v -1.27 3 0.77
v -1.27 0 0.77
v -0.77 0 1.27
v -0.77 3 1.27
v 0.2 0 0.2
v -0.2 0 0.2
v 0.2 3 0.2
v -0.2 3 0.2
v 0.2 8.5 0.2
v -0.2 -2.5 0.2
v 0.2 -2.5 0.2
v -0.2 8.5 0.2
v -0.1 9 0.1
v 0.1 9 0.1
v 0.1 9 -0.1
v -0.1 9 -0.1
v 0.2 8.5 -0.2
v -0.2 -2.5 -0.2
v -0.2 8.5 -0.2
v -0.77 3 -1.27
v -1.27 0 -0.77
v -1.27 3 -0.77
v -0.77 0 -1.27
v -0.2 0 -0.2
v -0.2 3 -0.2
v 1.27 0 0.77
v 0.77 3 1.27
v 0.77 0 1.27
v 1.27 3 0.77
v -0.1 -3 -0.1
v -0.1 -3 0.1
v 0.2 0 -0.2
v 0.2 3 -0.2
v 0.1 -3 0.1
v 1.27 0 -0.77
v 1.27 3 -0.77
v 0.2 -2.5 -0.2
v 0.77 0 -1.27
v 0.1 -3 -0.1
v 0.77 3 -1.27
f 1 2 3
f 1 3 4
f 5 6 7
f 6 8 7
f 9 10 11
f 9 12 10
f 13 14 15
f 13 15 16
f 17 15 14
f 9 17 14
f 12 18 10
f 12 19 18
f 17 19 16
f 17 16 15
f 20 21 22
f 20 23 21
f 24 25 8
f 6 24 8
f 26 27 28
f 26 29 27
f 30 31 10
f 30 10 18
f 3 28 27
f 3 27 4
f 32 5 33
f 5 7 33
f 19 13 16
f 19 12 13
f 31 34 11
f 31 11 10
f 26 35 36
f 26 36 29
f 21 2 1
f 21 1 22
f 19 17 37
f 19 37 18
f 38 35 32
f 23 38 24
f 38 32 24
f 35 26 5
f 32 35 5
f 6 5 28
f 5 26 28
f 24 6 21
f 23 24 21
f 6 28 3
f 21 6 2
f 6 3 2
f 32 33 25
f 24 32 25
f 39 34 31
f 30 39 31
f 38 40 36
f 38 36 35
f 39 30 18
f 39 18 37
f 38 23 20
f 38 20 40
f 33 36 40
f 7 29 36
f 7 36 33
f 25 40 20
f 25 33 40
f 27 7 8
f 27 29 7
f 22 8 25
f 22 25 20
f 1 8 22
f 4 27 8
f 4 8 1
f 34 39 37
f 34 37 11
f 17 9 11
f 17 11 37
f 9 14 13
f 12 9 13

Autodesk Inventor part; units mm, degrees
ref_plane "YZ Plane" through (0, 0, 0) normal (1, 0, 0) x (0, 1, 0)
ref_plane "XZ Plane" through (0, 0, 0) normal (0, 1, 0) x (-1, 0, 0)
ref_plane "XY Plane" through (0, 0, 0) normal (0, 0, 1) x (1, 0, 0)
sketch "Sketch1" plane through (0, 0, 0) normal (0, 1, 0) x (-1, 0, 0)
  line L0 (-1.27, 1.27) -> (1.27, 1.27)
  line L1 (1.27, 1.27) -> (1.27, -1.27)
  line L2 (1.27, -1.27) -> (-1.27, -1.27)
  line L3 (-1.27, -1.27) -> (-1.27, 1.27)
  line L4 (-1.27, 1.27) -> (1.27, -1.27) construction
  line L5 (1.27, 1.27) -> (-1.27, -1.27) construction
  line L6 (-0.3, 0.3) -> (0.3, 0.3)
  line L7 (0.3, 0.3) -> (0.3, -0.3)
  line L8 (0.3, -0.3) -> (-0.3, -0.3)
  line L9 (-0.3, -0.3) -> (-0.3, 0.3)
  line L10 (-0.3, 0.3) -> (0.3, -0.3) construction
  line L11 (0.3, 0.3) -> (-0.3, -0.3) construction
  point P0 (0, 0)
  dimension "d0" = 2.54
  dimension "d1" = 2.54
  dimension "d2" = 0.6
  dimension "d3" = 0.6
extrude "Extrusion1" add sketch "Sketch1" along normal blind 9 and the other way blind 3 contours L6 L7 L8 L9
extrude "Extrusion2" add sketch "Sketch1" along normal blind 3 separate body
sketch "Sketch2" plane through (0, 9, 0) normal (0, 1, 0) x (1, 0, 0)
  line L0 (-0.2, -0.2) -> (0.2, -0.2)
  line L1 (0.2, -0.2) -> (0.2, 0.2)
  line L2 (0.2, 0.2) -> (-0.2, 0.2)
  line L3 (-0.2, 0.2) -> (-0.2, -0.2)
  line L4 (-0.2, -0.2) -> (0.2, 0.2) construction
  line L5 (0.2, -0.2) -> (-0.2, 0.2) construction
  line L6 (-2.0289, -1.4927) -> (2.0289, -1.4927)
  line L7 (2.0289, -1.4927) -> (2.0289, 1.4927)
  line L8 (2.0289, 1.4927) -> (-2.0289, 1.4927)
  line L9 (-2.0289, 1.4927) -> (-2.0289, -1.4927)
  line L10 (-2.0289, -1.4927) -> (2.0289, 1.4927) construction
  line L11 (2.0289, -1.4927) -> (-2.0289, 1.4927) construction
  point P0 (0, 0)
  dimension "d37" = 0.4
  dimension "d38" = 0.4
extrude "Extrusion3" cut sketch "Sketch2" against normal blind 20 bodies 1
sketch "Sketch3" plane through (0, 3, 0) normal (0, 1, 0) x (1, 0, 0)
  line L0 (-0.3, 0.3) -> (0.3, 0.3) projected
  line L1 (-0.3, -0.3) -> (0.3, -0.3)
  line L2 (0.3, -0.3) -> (0.3, 0.3)
  line L3 (0.3, 0.3) -> (-0.3, 0.3)
  line L4 (-0.3, 0.3) -> (-0.3, -0.3)
  line L5 (-0.3, -0.3) -> (0.3, 0.3) construction
  line L6 (0.3, -0.3) -> (-0.3, 0.3) construction
  line L7 (0.2, -0.2) -> (0.2, 0.2) projected
  line L8 (-0.2, -0.2) -> (0.2, -0.2)
  line L9 (0.2, -0.2) -> (0.2, 0.2)
  line L10 (0.2, 0.2) -> (-0.2, 0.2)
  line L11 (-0.2, 0.2) -> (-0.2, -0.2)
  line L12 (-0.2, -0.2) -> (0.2, 0.2) construction
  line L13 (0.2, -0.2) -> (-0.2, 0.2) construction
  point P0 (0, 0)
extrude "Extrusion4" add sketch "Sketch3" against normal blind 3 bodies 2
chamfer "Chamfer10" distance 0.5 angle 45 4 edges at (1.27, 1.5, -1.27) (-1.27, 1.5, -1.27) (-1.27, 1.5, 1.27) (1.27, 1.5, 1.27)
chamfer "Chamfer11" distance 0.1 distance2 0.5 1 edges at (0.2, 9, 0) measured on face at (-0.0667, 9, -0.0667)
chamfer "Chamfer12" distance 0.1 distance2 0.5 1 edges at (-0.05, 9, 0.2) measured on face at (-0.1, 9, -0.0667)
chamfer "Chamfer13" distance 0.1 distance2 0.5 1 edges at (-0.2, 9, -0.05) measured on face at (-0.1, 9, -0.1)
chamfer "Chamfer14" distance 0.1 distance2 0.5 1 edges at (0, 9, -0.2) measured on face at (0.0333, 9, 0)
chamfer "Chamfer15" distance 0.1 distance2 0.5 1 edges at (-0.2, -3, 0) measured on face at (-0.0667, -3, -0.0667)
chamfer "Chamfer16" distance 0.1 distance2 0.5 1 edges at (0.05, -3, 0.2) measured on face at (0, -3, -0.0667)
chamfer "Chamfer17" distance 0.1 distance2 0.5 1 edges at (0.2, -3, -0.05) measured on face at (0.1, -3, 0)
chamfer "Chamfer18" distance 0.1 distance2 0.5 1 edges at (0, -3, -0.2) measured on face at (0.0333, -3, 0)
properties part number "MaleHeaderPin"
